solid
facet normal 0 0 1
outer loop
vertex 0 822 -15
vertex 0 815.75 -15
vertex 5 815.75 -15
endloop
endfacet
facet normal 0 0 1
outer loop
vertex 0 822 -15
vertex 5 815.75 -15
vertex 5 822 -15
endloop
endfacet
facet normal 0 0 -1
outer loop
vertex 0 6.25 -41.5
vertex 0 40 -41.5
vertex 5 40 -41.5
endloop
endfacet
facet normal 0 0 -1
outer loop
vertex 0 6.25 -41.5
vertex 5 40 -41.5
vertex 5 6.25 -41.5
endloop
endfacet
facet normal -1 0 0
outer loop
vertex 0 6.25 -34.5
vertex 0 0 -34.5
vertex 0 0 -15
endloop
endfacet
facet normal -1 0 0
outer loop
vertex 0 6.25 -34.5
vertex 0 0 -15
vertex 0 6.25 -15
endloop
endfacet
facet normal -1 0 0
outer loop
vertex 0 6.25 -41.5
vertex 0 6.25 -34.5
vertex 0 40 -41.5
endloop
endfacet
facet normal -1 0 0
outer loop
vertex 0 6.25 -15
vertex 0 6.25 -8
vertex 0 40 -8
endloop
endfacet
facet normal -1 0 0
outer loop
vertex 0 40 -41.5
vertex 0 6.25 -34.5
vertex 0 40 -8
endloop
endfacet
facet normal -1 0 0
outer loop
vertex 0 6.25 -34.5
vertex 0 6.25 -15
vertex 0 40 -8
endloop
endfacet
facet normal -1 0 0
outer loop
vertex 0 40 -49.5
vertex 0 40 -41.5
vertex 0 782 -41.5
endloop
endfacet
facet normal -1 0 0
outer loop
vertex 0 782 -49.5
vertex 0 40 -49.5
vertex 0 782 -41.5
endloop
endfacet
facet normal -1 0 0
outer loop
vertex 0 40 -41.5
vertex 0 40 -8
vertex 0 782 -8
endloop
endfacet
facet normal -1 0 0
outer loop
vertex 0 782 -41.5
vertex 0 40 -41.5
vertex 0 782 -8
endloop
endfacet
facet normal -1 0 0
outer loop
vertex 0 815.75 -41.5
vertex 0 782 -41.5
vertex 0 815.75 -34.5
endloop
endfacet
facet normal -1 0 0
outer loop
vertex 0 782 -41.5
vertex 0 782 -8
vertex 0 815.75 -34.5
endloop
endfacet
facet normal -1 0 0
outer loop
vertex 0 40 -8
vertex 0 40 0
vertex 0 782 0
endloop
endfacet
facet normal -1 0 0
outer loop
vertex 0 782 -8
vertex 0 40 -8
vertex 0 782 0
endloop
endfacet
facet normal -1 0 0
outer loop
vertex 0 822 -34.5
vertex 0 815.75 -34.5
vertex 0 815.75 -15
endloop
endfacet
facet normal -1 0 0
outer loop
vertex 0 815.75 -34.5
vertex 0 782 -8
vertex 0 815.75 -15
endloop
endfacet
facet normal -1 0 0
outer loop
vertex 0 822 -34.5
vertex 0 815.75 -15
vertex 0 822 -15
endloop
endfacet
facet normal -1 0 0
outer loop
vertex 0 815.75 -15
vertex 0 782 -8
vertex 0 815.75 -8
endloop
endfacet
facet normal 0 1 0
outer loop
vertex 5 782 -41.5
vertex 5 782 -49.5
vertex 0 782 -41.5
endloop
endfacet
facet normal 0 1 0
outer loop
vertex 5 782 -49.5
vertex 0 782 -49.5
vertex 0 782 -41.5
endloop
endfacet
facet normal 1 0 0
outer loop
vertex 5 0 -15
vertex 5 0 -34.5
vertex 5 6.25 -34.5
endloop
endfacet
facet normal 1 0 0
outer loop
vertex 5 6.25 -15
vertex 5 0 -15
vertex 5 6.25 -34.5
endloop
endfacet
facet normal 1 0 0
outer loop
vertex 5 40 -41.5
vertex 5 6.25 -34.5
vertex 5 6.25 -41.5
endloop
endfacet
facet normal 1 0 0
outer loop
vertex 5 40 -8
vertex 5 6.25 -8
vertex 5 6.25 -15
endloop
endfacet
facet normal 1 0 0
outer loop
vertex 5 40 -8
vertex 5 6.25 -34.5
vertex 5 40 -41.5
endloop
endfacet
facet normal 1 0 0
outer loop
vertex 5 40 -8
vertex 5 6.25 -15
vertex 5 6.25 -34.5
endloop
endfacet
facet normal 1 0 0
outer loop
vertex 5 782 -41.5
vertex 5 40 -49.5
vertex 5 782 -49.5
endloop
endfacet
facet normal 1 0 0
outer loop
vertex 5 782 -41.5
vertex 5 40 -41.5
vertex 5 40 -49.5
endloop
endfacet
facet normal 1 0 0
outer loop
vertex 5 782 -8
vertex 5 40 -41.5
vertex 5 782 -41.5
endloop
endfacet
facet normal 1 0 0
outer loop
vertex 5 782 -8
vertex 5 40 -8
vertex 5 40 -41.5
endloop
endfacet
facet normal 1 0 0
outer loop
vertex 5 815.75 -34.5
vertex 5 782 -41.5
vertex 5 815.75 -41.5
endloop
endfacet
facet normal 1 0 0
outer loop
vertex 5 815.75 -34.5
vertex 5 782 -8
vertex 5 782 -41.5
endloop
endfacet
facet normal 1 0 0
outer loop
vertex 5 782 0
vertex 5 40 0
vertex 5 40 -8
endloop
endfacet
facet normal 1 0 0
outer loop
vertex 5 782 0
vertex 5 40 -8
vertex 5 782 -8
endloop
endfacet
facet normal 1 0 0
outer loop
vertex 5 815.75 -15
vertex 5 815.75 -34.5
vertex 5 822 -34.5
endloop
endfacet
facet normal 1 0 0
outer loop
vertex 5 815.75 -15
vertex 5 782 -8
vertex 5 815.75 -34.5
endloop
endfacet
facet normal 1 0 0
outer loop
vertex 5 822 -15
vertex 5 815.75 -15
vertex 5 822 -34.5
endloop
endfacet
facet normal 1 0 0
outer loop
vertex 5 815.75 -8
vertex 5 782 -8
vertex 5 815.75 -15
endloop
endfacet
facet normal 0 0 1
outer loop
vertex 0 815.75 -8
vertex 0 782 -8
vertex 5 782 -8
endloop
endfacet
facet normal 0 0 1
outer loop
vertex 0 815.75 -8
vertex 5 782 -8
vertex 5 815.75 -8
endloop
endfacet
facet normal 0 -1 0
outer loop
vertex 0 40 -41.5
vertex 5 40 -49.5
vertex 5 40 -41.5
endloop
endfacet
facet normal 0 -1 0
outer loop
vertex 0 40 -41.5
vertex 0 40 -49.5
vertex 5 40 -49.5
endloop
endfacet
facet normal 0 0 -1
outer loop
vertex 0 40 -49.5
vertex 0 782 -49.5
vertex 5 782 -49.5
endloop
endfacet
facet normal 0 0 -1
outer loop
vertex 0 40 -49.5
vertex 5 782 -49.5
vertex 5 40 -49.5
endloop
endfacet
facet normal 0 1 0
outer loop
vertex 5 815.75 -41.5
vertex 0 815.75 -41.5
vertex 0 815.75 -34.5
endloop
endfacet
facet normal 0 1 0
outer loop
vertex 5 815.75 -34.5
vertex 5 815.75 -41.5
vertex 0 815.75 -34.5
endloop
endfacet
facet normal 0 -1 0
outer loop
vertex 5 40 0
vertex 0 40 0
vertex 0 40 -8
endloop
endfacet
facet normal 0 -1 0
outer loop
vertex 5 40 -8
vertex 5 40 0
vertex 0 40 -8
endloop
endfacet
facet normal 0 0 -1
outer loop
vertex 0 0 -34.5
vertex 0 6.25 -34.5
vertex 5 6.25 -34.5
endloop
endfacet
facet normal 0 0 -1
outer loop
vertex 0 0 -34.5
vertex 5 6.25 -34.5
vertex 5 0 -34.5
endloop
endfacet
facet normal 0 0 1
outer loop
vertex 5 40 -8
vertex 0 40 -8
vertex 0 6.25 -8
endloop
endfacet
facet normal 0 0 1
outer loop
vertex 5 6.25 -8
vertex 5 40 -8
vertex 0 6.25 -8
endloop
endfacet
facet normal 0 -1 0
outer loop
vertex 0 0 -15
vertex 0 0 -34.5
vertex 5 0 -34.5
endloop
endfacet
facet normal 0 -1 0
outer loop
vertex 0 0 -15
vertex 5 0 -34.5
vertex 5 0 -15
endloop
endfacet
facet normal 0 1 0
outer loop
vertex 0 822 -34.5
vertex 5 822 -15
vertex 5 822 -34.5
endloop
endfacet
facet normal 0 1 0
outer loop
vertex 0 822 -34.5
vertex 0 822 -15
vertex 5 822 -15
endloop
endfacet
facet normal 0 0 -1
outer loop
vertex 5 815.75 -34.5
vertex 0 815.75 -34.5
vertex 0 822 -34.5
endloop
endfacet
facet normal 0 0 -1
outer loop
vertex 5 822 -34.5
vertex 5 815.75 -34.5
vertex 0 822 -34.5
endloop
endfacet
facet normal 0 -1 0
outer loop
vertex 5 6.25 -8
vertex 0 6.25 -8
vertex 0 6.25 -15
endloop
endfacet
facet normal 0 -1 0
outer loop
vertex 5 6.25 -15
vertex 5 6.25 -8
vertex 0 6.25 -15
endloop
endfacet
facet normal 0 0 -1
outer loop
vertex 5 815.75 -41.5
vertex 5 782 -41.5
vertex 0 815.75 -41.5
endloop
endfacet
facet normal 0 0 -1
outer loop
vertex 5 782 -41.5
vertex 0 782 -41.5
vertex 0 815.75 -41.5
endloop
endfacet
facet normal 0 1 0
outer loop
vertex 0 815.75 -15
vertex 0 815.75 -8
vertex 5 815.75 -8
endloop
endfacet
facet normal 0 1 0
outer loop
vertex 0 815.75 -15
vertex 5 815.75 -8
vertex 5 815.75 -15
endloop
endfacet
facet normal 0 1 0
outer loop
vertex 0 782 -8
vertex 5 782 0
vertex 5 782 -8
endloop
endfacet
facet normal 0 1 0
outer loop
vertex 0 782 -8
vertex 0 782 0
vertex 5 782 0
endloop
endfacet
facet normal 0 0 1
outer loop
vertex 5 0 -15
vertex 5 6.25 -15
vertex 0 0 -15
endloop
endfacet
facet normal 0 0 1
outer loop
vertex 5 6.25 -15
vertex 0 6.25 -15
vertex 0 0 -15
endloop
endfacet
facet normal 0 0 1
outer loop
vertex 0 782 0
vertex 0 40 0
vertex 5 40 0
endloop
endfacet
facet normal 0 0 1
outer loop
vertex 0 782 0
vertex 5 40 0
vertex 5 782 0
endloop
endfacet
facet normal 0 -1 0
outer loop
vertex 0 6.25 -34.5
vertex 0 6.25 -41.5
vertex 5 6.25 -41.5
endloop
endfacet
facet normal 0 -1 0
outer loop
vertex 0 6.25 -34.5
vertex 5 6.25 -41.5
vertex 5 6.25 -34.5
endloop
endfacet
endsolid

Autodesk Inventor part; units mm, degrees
ref_plane "YZ Plane" through (0, 0, 0) normal (1, 0, 0) x (0, 1, 0)
ref_plane "XZ Plane" through (0, 0, 0) normal (0, 1, 0) x (-1, 0, 0)
ref_plane "XY Plane" through (0, 0, 0) normal (0, 0, 1) x (1, 0, 0)
sketch "Sketch1" plane through (0, 0, 0) normal (1, 0, 0) x (0, 1, 0)
  line L0 (0, 0) -> (822, 0)
  line L1 (822, 0) -> (822, -49.5)
  line L2 (822, -49.5) -> (0, -49.5)
  line L3 (0, -49.5) -> (0, 0)
  line L4 (822, 0) -> (815.75, 0)
  line L5 (815.75, 0) -> (815.75, -15)
  line L6 (815.75, -15) -> (822, -15)
  line L7 (822, -15) -> (822, 0)
  line L8 (822, 0) -> (782, 0)
  line L9 (782, 0) -> (782, -8)
  line L10 (782, -8) -> (822, -8)
  line L11 (822, -8) -> (822, 0)
  line L12 (856.5319, -24.75) -> (-65.1606, -24.75) construction
  line L13 (411, 165.682) -> (411, -1074.2454) construction
  line L14 (822, -49.5) -> (815.75, -49.5)
  line L15 (815.75, -49.5) -> (815.75, -34.5)
  line L16 (815.75, -34.5) -> (822, -34.5)
  line L17 (822, -34.5) -> (822, -49.5)
  line L18 (822, -49.5) -> (782, -49.5)
  line L19 (782, -49.5) -> (782, -41.5)
  line L20 (782, -41.5) -> (822, -41.5)
  line L21 (822, -41.5) -> (822, -49.5)
  line L22 (0, 0) -> (0, -49.5)
  line L23 (0, 0) -> (6.25, 0)
  line L24 (6.25, 0) -> (6.25, -15)
  line L25 (6.25, -15) -> (0, -15)
  line L26 (0, -15) -> (0, 0)
  line L27 (0, 0) -> (40, 0)
  line L28 (40, 0) -> (40, -8)
  line L29 (40, -8) -> (0, -8)
  line L30 (0, -8) -> (0, 0)
  line L31 (6.25, -34.5) -> (0, -34.5)
  line L32 (40, -41.5) -> (0, -41.5)
  line L33 (0, -49.5) -> (6.25, -49.5)
  line L34 (6.25, -49.5) -> (6.25, -34.5)
  line L35 (0, -34.5) -> (0, -49.5)
  line L36 (0, -49.5) -> (40, -49.5)
  line L37 (40, -49.5) -> (40, -41.5)
  line L38 (0, -41.5) -> (0, -49.5)
  point P0 (40, -49.5)
  point P1 (782, -49.5)
  point P2 (815.75, -41.5)
  point P3 (822, -34.5)
  point P4 (822, -15)
  point P5 (815.75, -8)
  point P6 (782, 0)
  point P7 (40, 0)
  point P8 (6.25, -8)
  point P9 (0, -15)
  point P10 (0, -34.5)
  point P11 (6.25, -41.5)
  dimension "d0" = 822
  dimension "d1" = 49.5
  dimension "d2" = 15
  dimension "d3" = 40
  dimension "d4" = 8
  dimension "d5" = 6.25
  dimension "d6" = 24.75
  dimension "d7" = 411
extrude "Extrusion1" add sketch "Sketch1" along normal blind 5 contours L0 L9 L10 L5 L6 L1 L16 L15 L20 L19 L2 L37 L32 L34 L31 L3 L25 L24 L29 L28
equation "\"d6\" = 0.5 * d1"
equation "\"d7\" = 0.5 * d0"
properties part number "Acrly_Wand_1"
